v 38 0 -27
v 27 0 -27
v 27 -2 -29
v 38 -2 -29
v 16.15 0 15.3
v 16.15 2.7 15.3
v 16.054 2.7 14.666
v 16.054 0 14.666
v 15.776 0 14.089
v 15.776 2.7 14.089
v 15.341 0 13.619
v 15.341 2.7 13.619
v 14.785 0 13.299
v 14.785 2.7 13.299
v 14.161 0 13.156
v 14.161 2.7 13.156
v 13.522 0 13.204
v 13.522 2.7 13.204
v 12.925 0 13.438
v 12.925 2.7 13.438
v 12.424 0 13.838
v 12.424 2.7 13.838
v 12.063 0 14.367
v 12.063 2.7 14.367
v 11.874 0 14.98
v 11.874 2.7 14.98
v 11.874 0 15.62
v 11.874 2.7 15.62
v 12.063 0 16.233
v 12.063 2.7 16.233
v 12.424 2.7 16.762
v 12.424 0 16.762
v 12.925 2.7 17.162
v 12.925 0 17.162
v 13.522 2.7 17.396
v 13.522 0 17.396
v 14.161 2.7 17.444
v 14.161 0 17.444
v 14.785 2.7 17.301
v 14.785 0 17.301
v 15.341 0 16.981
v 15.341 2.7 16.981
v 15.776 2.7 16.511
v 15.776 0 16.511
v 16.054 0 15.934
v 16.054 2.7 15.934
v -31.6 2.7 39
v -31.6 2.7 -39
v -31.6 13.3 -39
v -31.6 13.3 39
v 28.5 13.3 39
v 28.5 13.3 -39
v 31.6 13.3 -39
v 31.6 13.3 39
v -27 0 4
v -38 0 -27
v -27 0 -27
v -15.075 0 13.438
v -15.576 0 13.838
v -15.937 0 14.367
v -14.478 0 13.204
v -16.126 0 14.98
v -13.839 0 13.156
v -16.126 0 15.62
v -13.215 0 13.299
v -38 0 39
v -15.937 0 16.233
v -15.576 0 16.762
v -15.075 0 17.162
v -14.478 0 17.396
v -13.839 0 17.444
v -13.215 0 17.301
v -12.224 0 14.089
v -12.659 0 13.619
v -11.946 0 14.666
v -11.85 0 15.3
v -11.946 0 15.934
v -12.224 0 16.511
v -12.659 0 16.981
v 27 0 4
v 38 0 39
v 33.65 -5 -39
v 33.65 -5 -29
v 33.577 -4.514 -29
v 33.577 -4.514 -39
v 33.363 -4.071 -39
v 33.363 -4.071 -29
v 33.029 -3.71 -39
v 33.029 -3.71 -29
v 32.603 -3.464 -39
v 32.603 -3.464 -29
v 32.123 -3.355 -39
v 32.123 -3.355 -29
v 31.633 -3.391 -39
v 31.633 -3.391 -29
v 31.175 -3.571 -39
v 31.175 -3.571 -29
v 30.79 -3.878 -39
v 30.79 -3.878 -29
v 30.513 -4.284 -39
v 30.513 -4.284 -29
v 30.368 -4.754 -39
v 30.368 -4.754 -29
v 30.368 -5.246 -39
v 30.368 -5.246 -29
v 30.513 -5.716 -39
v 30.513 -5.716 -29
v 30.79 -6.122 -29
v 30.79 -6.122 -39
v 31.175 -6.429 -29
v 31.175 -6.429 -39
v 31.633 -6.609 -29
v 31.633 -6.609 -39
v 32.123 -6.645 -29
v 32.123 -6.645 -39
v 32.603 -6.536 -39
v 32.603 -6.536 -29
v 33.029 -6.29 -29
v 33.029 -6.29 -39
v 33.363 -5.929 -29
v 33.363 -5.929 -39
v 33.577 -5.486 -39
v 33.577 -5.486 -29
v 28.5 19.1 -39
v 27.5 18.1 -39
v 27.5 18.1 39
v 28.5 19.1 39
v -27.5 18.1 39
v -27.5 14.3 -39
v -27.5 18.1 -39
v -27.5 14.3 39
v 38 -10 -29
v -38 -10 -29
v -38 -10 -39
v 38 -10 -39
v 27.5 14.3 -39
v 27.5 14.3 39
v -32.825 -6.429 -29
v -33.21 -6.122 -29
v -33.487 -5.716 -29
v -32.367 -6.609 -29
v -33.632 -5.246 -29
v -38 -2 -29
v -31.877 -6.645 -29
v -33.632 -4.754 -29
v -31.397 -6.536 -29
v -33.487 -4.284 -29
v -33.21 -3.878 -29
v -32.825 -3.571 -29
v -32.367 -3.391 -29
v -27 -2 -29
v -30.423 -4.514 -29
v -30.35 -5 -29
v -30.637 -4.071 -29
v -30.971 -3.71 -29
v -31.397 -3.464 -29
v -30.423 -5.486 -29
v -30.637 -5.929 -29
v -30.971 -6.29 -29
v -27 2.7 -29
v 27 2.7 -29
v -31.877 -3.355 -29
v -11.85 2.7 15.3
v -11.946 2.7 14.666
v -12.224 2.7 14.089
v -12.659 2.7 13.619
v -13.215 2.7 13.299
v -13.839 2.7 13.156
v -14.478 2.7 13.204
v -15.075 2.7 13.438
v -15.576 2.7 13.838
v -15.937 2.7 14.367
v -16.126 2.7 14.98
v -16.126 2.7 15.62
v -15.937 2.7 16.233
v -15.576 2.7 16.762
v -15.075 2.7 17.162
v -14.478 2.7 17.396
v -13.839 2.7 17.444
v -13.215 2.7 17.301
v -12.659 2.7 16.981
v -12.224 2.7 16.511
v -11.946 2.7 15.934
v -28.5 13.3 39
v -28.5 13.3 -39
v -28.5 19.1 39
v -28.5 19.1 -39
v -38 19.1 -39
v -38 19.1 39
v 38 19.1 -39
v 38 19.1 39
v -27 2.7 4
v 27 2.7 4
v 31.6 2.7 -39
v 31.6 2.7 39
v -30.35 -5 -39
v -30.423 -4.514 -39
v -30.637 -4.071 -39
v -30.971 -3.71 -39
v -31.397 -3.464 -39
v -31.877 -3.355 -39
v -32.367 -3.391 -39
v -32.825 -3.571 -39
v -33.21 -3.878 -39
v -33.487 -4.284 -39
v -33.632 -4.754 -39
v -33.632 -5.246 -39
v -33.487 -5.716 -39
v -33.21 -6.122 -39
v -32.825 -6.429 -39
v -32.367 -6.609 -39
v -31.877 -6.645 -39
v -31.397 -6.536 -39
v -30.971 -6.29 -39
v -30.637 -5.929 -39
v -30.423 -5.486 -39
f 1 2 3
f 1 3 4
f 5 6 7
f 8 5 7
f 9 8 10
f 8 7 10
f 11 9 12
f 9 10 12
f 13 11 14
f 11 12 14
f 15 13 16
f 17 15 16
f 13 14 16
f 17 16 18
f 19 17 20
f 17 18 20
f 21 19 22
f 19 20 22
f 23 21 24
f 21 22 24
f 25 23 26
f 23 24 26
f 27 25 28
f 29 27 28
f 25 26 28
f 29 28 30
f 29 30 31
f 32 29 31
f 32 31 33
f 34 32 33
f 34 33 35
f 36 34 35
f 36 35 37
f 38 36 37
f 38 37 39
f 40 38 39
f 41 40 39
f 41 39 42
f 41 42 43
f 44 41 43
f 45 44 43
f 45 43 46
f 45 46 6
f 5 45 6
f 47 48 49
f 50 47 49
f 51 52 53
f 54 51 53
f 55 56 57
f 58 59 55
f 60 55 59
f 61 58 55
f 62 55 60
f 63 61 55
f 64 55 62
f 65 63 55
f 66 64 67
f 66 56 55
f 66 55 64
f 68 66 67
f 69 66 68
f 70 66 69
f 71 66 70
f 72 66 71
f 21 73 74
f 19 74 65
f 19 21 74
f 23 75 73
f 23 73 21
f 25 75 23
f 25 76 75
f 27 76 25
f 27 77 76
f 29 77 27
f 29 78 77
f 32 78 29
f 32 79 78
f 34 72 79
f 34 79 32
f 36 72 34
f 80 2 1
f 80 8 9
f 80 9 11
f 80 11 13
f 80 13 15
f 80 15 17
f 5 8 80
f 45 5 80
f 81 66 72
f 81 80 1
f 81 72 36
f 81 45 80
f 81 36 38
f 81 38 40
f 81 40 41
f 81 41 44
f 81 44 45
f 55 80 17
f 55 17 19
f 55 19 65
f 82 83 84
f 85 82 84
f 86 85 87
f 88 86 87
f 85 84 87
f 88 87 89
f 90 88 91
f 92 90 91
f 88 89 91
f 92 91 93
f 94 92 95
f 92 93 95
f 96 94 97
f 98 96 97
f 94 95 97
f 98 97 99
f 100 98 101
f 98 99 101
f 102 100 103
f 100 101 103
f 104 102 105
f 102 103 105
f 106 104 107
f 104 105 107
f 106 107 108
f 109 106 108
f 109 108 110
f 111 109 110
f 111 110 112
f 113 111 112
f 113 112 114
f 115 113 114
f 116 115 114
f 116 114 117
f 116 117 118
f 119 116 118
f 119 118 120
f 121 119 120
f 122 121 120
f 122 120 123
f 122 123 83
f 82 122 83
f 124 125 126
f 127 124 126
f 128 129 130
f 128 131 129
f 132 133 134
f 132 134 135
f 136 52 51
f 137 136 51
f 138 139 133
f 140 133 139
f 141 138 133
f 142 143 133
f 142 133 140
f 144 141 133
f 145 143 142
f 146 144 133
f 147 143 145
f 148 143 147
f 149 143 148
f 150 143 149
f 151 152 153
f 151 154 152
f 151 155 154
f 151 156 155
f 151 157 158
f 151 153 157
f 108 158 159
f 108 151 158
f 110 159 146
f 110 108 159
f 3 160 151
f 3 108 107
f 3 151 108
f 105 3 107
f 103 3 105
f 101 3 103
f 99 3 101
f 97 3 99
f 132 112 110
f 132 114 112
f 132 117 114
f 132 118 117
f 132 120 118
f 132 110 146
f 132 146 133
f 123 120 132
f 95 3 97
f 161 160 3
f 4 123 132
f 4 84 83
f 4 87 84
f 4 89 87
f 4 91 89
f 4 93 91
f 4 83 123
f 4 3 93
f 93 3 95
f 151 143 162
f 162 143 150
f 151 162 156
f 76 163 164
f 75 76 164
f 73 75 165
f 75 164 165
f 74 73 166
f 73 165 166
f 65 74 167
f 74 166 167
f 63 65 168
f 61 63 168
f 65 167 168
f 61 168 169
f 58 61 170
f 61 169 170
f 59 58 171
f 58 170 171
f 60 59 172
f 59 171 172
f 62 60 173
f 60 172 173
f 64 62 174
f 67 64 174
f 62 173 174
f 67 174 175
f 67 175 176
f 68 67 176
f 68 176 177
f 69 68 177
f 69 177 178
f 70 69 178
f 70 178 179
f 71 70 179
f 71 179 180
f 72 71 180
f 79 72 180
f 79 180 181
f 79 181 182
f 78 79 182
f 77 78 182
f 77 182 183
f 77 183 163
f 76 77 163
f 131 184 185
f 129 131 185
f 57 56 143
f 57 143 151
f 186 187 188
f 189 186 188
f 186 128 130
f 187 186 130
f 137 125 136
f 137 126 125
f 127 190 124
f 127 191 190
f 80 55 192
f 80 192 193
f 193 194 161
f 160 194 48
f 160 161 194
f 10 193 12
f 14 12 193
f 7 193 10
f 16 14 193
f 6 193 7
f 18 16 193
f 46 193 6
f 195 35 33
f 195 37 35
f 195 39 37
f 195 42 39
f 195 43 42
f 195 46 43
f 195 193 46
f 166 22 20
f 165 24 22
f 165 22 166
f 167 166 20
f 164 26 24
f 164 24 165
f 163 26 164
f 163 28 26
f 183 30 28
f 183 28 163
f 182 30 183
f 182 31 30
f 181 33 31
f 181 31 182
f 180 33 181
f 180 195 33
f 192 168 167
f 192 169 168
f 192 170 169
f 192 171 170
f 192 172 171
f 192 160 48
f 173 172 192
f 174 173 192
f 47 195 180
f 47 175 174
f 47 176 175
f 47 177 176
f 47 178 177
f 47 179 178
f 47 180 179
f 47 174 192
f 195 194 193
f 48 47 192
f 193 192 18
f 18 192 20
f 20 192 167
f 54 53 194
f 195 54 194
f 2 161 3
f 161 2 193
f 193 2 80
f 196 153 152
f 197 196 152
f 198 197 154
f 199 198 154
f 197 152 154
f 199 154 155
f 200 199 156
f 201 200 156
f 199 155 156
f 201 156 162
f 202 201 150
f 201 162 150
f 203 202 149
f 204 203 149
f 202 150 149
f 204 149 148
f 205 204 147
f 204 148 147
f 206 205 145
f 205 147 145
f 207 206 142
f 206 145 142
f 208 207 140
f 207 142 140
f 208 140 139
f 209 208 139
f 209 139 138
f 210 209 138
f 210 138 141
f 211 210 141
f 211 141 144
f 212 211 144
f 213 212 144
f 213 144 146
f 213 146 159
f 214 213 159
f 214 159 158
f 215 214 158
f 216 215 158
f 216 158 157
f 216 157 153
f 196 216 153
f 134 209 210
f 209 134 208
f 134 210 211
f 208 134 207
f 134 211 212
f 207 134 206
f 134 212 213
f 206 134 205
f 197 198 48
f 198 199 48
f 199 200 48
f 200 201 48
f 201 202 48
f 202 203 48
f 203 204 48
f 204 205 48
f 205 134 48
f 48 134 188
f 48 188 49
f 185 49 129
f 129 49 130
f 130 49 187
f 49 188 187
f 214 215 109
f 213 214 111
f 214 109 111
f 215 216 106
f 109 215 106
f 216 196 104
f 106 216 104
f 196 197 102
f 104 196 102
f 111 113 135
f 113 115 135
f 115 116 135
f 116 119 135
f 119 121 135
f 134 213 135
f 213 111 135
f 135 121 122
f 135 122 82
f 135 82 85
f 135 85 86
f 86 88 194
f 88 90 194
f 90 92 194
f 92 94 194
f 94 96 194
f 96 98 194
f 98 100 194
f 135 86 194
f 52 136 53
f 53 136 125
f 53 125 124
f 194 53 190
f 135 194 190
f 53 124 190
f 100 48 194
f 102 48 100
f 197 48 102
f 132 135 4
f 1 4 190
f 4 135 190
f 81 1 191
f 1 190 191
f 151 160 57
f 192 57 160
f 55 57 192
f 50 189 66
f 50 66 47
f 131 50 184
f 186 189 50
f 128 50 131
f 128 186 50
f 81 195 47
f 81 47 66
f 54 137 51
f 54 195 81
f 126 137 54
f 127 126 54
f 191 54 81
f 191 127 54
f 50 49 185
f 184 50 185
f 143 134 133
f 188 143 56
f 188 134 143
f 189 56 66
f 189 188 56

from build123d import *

# Parameters (mm, degrees)
EXTRUDE_1_DEPTH      = 39
HOLE_WIZARD_M4_1_D   = 4.3
CHAMFER_1_SIZE       = 1
SKETCH_8_W           = 76
SKETCH_8_H           = 10
EXTRUDE_2_DEPTH      = 10
CUT_EXTRUDE_2_REACH  = 59.705
SKETCH_9_W           = 54
SKETCH_9_H           = 33
CHAMFER_2_SIZE       = 2
HOLE_WIZARD_M4_1_2_D = 3.3


with BuildPart() as part:
    # 草图1 → 凸台-拉伸1 (new, symmetric)
    with BuildSketch(Plane.XY):
        Polygon((-27.5, 19.1), (-38, 19.1), (-38, 0), (38, 0), (38, 19.1), (27.5, 19.1), (27.5, 13.3), (31.6, 13.3), (31.6, 2.7), (-31.6, 2.7), (-31.6, 13.3), (-27.5, 13.3), align=None)
    extrude(amount=EXTRUDE_1_DEPTH, both=True)

    # Hole Wizard M4 _1 (through all)
    with Locations(Plane(origin=(0, 0, 0), x_dir=(-1, 0, 0), z_dir=(0, -1, 0))):
        with Locations((-14, -15.3), (14, -15.3)):
            Hole(HOLE_WIZARD_M4_1_D / 2)

    # 倒角1
    chamfer_1_edges = [part.edges().sort_by_distance(p)[0] for p in [
        (-27.5, 13.3, 0),
        (27.5, 13.3, 0),
        (27.5, 19.1, 0),
        (-27.5, 19.1, 0),
    ]]
    chamfer(chamfer_1_edges, length=CHAMFER_1_SIZE)

    # 草图8 → 凸台-拉伸2 (add)
    with BuildSketch(Plane.XZ):
        with Locations((0, -34)):
            Rectangle(SKETCH_8_W, SKETCH_8_H)
    extrude(amount=EXTRUDE_2_DEPTH)

    # 草图9 → 切除-拉伸2 (cut, up to next)
    with BuildSketch(Plane.XZ, mode=Mode.PRIVATE) as cut_extrude_2_sk1:
        with Locations((0, -12.5)):
            Rectangle(SKETCH_9_W, SKETCH_9_H)
    cut_extrude_2_tool1 = extrude(cut_extrude_2_sk1.sketch, amount=-CUT_EXTRUDE_2_REACH, mode=Mode.PRIVATE) & part.part
    add(cut_extrude_2_tool1.solids().sort_by_distance((0, 0, -12.5))[0], mode=Mode.SUBTRACT)

    # 倒角2
    chamfer_2_edges = [part.edges().sort_by_distance(p)[0] for p in [
        (32.5, 0, -29),
        (-32.5, 0, -29),
    ]]
    chamfer(chamfer_2_edges, length=CHAMFER_2_SIZE)

    # Hole Wizard M4 _1 2 (through all)
    with Locations(Plane(origin=(0, 0, -39), x_dir=(-1, 0, 0), z_dir=(0, 0, -1))):
        with Locations((32, -5), (-32, -5)):
            Hole(HOLE_WIZARD_M4_1_2_D / 2)


solid = part.part
